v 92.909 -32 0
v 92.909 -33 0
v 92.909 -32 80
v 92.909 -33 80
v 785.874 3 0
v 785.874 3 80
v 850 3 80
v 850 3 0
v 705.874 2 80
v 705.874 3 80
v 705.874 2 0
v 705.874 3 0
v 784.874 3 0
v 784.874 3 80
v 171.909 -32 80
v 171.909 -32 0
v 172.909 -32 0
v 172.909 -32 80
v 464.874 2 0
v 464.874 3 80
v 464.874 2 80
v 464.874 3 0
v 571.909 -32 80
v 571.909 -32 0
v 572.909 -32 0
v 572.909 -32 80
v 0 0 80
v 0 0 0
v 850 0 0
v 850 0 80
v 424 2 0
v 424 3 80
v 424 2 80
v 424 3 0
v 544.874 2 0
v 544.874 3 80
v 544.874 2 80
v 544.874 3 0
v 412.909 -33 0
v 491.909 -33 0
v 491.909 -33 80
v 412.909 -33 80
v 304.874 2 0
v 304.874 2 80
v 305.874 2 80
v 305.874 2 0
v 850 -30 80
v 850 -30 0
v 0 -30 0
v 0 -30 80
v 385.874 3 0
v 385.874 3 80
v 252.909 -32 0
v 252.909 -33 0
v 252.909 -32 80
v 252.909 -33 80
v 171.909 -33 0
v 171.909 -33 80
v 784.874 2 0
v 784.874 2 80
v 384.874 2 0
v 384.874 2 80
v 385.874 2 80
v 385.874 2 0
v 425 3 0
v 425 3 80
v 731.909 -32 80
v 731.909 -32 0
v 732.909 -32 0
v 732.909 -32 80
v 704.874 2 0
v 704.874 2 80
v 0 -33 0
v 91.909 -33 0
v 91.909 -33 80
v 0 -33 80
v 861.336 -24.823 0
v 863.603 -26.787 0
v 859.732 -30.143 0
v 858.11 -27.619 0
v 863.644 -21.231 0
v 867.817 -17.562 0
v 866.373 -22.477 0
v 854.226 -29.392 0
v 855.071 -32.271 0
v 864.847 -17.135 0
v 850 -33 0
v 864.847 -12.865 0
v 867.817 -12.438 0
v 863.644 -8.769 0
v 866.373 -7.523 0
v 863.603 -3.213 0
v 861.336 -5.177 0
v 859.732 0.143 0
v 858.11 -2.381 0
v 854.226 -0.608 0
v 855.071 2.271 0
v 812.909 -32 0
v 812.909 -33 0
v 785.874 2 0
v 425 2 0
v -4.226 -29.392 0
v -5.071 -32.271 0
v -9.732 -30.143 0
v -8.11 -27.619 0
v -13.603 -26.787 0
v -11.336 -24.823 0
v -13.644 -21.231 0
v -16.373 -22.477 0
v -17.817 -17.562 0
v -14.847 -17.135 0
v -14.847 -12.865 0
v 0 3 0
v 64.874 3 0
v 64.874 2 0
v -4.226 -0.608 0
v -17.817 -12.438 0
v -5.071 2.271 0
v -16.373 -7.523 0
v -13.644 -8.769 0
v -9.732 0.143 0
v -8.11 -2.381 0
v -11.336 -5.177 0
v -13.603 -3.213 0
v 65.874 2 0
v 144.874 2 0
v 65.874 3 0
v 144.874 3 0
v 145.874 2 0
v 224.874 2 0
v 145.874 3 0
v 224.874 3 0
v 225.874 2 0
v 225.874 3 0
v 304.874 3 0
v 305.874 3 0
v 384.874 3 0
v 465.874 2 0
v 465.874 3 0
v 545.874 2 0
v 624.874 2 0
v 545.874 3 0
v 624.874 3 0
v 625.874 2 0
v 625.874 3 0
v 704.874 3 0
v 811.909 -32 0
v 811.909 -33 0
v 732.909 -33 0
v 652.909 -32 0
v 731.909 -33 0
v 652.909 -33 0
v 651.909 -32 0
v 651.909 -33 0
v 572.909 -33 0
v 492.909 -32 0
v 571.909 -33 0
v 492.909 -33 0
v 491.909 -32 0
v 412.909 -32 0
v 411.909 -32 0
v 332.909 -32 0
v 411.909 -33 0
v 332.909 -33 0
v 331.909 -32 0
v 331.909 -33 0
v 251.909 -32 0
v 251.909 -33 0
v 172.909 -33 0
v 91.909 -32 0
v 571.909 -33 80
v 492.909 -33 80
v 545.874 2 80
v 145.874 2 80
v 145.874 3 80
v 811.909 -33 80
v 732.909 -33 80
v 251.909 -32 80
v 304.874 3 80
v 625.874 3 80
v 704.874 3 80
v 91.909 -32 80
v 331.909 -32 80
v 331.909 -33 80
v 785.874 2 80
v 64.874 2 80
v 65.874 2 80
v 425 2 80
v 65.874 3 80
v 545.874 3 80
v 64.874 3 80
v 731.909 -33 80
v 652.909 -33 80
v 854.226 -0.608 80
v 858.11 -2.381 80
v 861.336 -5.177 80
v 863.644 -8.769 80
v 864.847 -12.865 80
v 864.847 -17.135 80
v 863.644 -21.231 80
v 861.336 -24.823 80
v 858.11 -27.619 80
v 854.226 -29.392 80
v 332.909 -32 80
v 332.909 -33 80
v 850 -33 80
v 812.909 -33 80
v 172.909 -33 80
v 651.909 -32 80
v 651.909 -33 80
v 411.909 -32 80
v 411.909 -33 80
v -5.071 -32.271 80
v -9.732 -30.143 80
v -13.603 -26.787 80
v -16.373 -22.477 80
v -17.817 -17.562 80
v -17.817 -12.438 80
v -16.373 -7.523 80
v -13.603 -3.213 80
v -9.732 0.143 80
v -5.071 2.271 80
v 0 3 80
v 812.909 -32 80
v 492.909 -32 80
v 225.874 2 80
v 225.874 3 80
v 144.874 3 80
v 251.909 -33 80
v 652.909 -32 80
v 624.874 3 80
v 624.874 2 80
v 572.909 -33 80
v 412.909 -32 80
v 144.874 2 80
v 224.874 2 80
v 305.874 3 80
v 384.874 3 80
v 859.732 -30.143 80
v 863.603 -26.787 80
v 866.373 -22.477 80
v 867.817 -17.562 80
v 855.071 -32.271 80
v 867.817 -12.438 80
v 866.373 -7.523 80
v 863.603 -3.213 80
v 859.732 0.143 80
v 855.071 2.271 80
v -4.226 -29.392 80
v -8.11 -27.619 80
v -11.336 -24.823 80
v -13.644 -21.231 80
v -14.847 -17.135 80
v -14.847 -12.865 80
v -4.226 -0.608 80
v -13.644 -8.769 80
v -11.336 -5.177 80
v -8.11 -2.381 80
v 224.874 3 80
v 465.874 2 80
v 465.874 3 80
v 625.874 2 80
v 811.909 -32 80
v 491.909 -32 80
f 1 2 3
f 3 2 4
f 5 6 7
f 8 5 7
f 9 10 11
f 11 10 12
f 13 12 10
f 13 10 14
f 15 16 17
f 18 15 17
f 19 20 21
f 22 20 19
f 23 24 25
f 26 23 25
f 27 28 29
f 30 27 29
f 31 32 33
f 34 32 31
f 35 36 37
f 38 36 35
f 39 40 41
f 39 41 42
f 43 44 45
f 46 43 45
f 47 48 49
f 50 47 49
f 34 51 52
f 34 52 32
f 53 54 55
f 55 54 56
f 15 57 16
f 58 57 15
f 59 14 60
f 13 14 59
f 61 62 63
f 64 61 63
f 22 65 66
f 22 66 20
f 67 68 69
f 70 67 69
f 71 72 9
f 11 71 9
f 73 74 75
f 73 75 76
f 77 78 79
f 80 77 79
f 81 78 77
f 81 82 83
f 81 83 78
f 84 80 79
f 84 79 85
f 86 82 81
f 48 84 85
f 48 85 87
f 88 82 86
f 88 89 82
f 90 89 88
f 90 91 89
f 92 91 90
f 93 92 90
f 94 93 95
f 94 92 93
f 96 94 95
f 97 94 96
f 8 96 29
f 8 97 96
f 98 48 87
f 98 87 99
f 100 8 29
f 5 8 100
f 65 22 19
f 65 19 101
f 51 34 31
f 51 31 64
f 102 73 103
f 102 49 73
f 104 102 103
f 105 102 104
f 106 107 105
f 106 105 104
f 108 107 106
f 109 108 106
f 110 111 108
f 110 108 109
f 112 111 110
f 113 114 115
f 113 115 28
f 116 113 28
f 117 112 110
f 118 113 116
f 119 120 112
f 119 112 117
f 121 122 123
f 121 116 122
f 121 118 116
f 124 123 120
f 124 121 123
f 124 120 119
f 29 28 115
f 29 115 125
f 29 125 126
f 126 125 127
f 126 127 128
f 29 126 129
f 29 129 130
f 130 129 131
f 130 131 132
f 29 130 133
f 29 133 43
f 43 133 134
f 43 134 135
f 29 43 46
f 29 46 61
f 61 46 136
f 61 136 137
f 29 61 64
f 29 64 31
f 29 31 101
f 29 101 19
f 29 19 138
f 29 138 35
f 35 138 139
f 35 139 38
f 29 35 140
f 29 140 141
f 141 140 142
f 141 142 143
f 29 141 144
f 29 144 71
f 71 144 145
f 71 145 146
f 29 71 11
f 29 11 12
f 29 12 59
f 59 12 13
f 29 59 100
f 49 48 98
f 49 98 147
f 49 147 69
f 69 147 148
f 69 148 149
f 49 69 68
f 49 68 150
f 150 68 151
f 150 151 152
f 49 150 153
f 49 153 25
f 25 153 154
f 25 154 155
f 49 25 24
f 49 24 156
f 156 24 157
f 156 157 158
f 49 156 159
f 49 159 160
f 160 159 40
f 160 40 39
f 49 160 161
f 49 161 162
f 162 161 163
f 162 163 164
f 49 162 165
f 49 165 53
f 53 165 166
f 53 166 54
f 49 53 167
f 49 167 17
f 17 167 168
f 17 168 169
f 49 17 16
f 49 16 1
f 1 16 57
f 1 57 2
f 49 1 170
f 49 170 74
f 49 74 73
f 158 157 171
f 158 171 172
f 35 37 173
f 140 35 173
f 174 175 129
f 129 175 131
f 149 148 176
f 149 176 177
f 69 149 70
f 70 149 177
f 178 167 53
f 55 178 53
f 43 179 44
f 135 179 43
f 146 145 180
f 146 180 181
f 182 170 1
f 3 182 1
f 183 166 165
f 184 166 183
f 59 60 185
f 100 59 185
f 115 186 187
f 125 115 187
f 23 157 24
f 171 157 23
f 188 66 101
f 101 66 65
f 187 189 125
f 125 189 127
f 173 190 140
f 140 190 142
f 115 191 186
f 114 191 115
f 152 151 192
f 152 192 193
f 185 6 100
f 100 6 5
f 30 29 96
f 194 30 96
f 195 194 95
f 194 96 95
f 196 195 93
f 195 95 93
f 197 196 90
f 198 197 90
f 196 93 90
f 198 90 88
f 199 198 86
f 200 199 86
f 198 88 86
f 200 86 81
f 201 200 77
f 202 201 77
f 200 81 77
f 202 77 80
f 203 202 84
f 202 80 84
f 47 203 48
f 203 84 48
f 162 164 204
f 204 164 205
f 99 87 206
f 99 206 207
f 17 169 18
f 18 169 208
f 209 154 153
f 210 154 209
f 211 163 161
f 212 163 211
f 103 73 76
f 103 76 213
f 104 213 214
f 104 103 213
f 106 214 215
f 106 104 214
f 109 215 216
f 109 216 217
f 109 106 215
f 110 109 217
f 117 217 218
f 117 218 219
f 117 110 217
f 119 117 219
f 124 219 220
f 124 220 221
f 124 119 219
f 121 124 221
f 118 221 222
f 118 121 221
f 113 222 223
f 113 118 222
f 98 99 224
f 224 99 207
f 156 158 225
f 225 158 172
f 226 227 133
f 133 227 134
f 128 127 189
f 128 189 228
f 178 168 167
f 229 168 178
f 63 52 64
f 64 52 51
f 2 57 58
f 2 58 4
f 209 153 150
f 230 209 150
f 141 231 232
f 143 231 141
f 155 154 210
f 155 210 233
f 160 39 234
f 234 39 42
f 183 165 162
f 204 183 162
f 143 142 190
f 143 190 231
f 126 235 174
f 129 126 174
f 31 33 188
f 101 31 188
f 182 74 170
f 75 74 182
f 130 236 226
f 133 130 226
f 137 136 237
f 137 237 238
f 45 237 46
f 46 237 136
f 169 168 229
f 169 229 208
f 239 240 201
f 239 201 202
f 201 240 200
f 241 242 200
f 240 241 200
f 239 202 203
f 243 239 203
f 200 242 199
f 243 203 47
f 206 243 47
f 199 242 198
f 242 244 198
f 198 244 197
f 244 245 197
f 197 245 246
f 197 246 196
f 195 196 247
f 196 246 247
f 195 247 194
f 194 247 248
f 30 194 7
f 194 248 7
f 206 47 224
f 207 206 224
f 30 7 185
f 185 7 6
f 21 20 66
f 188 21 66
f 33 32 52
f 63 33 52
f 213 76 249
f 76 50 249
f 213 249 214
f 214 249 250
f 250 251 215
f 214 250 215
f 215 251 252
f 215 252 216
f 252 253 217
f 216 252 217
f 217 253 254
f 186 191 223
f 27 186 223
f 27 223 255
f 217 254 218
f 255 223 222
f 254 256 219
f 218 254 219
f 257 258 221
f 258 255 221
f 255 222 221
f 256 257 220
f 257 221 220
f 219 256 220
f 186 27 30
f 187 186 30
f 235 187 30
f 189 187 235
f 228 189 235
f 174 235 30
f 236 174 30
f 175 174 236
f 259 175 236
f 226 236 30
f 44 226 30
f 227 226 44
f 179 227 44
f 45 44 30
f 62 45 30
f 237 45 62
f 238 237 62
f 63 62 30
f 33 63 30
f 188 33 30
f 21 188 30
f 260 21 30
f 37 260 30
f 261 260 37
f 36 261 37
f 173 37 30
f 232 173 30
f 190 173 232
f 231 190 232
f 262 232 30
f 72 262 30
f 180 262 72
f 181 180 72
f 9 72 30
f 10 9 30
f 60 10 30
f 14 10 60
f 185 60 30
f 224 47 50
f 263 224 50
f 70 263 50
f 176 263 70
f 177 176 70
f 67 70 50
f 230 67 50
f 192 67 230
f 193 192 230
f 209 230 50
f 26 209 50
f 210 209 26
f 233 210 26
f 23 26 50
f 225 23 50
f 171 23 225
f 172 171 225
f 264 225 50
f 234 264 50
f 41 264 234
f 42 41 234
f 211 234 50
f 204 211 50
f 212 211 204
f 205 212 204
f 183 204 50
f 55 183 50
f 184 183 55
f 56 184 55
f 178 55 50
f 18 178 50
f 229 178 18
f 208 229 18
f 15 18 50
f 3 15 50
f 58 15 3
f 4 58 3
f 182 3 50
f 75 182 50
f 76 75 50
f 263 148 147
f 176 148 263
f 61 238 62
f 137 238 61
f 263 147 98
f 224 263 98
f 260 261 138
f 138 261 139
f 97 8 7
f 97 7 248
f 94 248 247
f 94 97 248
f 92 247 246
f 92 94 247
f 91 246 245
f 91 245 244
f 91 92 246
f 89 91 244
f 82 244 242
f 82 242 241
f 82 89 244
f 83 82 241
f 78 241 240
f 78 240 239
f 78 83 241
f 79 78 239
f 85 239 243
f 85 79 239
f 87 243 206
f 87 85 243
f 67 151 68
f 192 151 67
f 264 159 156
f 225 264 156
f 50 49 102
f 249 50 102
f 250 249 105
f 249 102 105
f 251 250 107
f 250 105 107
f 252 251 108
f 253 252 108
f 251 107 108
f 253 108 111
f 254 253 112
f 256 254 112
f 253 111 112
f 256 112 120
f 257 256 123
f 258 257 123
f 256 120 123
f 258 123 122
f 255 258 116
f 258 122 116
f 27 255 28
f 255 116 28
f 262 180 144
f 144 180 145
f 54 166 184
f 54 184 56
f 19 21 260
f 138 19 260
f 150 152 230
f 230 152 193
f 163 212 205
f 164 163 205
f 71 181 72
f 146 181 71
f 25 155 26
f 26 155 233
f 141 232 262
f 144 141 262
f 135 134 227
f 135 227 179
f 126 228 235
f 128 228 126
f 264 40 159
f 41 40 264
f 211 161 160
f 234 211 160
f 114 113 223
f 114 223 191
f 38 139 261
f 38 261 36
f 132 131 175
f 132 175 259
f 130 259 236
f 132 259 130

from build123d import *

# Parameters (mm, degrees)
EXTRUIR_L_MINA1_DEPTH        = 80
CROQUIS4_W                   = 1
CROQUIS4_H                   = 80
CORTAR_EXTRUIR_L_MINA1_DEPTH = 1
CROQUIS5_W                   = 1
CROQUIS5_H                   = 80
CORTAR_EXTRUIR_L_MINA2_DEPTH = 1


with BuildPart() as part:
    # Croquis1 → Extruir-Lámina1 (new body)
    with BuildSketch(Plane.XY):
        with BuildLine():
            Line((0, 3), (850, 3))
            ThreePointArc((850, 3), (868, -15), (850, -33))
            Line((850, -33), (0, -33))
            ThreePointArc((0, -33), (-18, -15), (0, 3))
        make_face()
        with BuildLine():
            Line((0, 0), (850, 0))
            ThreePointArc((850, 0), (865, -15), (850, -30))
            Line((850, -30), (0, -30))
            ThreePointArc((0, -30), (-15, -15), (0, 0))
        make_face(mode=Mode.SUBTRACT)
    extrude(amount=EXTRUIR_L_MINA1_DEPTH)

    # Croquis4 → Cortar-Extruir-Lámina1 (cut)
    with BuildSketch(Plane(origin=(0, 3, 0), x_dir=(1, 0, 0), z_dir=(0, 1, 0))):
        with Locations((424.5, -40)):
            Rectangle(CROQUIS4_W, CROQUIS4_H)
        with Locations((65.374468325, -40)):
            Rectangle(CROQUIS4_W, CROQUIS4_H)
        with Locations((145.374468325, -40)):
            Rectangle(CROQUIS4_W, CROQUIS4_H)
        with Locations((225.374468325, -40)):
            Rectangle(CROQUIS4_W, CROQUIS4_H)
        with Locations((305.374468325, -40)):
            Rectangle(CROQUIS4_W, CROQUIS4_H)
        with Locations((385.374468325, -40)):
            Rectangle(CROQUIS4_W, CROQUIS4_H)
        with Locations((465.374468325, -40)):
            Rectangle(CROQUIS4_W, CROQUIS4_H)
        with Locations((545.374468325, -40)):
            Rectangle(CROQUIS4_W, CROQUIS4_H)
        with Locations((625.374468325, -40)):
            Rectangle(CROQUIS4_W, CROQUIS4_H)
        with Locations((705.374468325, -40)):
            Rectangle(CROQUIS4_W, CROQUIS4_H)
        with Locations((785.374468325, -40)):
            Rectangle(CROQUIS4_W, CROQUIS4_H)
    extrude(amount=-CORTAR_EXTRUIR_L_MINA1_DEPTH, mode=Mode.SUBTRACT)

    # Croquis5 → Cortar-Extruir-Lámina2 (cut)
    with BuildSketch(Plane.XZ.offset(33)):
        with Locations((92.409174229, 40)):
            Rectangle(CROQUIS5_W, CROQUIS5_H)
        with Locations((172.409174229, 40)):
            Rectangle(CROQUIS5_W, CROQUIS5_H)
        with Locations((252.409174229, 40)):
            Rectangle(CROQUIS5_W, CROQUIS5_H)
        with Locations((332.409174229, 40)):
            Rectangle(CROQUIS5_W, CROQUIS5_H)
        with Locations((412.409174229, 40)):
            Rectangle(CROQUIS5_W, CROQUIS5_H)
        with Locations((492.409174229, 40)):
            Rectangle(CROQUIS5_W, CROQUIS5_H)
        with Locations((572.409174229, 40)):
            Rectangle(CROQUIS5_W, CROQUIS5_H)
        with Locations((652.409174229, 40)):
            Rectangle(CROQUIS5_W, CROQUIS5_H)
        with Locations((732.409174229, 40)):
            Rectangle(CROQUIS5_W, CROQUIS5_H)
        with Locations((812.409174229, 40)):
            Rectangle(CROQUIS5_W, CROQUIS5_H)
    extrude(amount=-CORTAR_EXTRUIR_L_MINA2_DEPTH, mode=Mode.SUBTRACT)


solid = part.part
